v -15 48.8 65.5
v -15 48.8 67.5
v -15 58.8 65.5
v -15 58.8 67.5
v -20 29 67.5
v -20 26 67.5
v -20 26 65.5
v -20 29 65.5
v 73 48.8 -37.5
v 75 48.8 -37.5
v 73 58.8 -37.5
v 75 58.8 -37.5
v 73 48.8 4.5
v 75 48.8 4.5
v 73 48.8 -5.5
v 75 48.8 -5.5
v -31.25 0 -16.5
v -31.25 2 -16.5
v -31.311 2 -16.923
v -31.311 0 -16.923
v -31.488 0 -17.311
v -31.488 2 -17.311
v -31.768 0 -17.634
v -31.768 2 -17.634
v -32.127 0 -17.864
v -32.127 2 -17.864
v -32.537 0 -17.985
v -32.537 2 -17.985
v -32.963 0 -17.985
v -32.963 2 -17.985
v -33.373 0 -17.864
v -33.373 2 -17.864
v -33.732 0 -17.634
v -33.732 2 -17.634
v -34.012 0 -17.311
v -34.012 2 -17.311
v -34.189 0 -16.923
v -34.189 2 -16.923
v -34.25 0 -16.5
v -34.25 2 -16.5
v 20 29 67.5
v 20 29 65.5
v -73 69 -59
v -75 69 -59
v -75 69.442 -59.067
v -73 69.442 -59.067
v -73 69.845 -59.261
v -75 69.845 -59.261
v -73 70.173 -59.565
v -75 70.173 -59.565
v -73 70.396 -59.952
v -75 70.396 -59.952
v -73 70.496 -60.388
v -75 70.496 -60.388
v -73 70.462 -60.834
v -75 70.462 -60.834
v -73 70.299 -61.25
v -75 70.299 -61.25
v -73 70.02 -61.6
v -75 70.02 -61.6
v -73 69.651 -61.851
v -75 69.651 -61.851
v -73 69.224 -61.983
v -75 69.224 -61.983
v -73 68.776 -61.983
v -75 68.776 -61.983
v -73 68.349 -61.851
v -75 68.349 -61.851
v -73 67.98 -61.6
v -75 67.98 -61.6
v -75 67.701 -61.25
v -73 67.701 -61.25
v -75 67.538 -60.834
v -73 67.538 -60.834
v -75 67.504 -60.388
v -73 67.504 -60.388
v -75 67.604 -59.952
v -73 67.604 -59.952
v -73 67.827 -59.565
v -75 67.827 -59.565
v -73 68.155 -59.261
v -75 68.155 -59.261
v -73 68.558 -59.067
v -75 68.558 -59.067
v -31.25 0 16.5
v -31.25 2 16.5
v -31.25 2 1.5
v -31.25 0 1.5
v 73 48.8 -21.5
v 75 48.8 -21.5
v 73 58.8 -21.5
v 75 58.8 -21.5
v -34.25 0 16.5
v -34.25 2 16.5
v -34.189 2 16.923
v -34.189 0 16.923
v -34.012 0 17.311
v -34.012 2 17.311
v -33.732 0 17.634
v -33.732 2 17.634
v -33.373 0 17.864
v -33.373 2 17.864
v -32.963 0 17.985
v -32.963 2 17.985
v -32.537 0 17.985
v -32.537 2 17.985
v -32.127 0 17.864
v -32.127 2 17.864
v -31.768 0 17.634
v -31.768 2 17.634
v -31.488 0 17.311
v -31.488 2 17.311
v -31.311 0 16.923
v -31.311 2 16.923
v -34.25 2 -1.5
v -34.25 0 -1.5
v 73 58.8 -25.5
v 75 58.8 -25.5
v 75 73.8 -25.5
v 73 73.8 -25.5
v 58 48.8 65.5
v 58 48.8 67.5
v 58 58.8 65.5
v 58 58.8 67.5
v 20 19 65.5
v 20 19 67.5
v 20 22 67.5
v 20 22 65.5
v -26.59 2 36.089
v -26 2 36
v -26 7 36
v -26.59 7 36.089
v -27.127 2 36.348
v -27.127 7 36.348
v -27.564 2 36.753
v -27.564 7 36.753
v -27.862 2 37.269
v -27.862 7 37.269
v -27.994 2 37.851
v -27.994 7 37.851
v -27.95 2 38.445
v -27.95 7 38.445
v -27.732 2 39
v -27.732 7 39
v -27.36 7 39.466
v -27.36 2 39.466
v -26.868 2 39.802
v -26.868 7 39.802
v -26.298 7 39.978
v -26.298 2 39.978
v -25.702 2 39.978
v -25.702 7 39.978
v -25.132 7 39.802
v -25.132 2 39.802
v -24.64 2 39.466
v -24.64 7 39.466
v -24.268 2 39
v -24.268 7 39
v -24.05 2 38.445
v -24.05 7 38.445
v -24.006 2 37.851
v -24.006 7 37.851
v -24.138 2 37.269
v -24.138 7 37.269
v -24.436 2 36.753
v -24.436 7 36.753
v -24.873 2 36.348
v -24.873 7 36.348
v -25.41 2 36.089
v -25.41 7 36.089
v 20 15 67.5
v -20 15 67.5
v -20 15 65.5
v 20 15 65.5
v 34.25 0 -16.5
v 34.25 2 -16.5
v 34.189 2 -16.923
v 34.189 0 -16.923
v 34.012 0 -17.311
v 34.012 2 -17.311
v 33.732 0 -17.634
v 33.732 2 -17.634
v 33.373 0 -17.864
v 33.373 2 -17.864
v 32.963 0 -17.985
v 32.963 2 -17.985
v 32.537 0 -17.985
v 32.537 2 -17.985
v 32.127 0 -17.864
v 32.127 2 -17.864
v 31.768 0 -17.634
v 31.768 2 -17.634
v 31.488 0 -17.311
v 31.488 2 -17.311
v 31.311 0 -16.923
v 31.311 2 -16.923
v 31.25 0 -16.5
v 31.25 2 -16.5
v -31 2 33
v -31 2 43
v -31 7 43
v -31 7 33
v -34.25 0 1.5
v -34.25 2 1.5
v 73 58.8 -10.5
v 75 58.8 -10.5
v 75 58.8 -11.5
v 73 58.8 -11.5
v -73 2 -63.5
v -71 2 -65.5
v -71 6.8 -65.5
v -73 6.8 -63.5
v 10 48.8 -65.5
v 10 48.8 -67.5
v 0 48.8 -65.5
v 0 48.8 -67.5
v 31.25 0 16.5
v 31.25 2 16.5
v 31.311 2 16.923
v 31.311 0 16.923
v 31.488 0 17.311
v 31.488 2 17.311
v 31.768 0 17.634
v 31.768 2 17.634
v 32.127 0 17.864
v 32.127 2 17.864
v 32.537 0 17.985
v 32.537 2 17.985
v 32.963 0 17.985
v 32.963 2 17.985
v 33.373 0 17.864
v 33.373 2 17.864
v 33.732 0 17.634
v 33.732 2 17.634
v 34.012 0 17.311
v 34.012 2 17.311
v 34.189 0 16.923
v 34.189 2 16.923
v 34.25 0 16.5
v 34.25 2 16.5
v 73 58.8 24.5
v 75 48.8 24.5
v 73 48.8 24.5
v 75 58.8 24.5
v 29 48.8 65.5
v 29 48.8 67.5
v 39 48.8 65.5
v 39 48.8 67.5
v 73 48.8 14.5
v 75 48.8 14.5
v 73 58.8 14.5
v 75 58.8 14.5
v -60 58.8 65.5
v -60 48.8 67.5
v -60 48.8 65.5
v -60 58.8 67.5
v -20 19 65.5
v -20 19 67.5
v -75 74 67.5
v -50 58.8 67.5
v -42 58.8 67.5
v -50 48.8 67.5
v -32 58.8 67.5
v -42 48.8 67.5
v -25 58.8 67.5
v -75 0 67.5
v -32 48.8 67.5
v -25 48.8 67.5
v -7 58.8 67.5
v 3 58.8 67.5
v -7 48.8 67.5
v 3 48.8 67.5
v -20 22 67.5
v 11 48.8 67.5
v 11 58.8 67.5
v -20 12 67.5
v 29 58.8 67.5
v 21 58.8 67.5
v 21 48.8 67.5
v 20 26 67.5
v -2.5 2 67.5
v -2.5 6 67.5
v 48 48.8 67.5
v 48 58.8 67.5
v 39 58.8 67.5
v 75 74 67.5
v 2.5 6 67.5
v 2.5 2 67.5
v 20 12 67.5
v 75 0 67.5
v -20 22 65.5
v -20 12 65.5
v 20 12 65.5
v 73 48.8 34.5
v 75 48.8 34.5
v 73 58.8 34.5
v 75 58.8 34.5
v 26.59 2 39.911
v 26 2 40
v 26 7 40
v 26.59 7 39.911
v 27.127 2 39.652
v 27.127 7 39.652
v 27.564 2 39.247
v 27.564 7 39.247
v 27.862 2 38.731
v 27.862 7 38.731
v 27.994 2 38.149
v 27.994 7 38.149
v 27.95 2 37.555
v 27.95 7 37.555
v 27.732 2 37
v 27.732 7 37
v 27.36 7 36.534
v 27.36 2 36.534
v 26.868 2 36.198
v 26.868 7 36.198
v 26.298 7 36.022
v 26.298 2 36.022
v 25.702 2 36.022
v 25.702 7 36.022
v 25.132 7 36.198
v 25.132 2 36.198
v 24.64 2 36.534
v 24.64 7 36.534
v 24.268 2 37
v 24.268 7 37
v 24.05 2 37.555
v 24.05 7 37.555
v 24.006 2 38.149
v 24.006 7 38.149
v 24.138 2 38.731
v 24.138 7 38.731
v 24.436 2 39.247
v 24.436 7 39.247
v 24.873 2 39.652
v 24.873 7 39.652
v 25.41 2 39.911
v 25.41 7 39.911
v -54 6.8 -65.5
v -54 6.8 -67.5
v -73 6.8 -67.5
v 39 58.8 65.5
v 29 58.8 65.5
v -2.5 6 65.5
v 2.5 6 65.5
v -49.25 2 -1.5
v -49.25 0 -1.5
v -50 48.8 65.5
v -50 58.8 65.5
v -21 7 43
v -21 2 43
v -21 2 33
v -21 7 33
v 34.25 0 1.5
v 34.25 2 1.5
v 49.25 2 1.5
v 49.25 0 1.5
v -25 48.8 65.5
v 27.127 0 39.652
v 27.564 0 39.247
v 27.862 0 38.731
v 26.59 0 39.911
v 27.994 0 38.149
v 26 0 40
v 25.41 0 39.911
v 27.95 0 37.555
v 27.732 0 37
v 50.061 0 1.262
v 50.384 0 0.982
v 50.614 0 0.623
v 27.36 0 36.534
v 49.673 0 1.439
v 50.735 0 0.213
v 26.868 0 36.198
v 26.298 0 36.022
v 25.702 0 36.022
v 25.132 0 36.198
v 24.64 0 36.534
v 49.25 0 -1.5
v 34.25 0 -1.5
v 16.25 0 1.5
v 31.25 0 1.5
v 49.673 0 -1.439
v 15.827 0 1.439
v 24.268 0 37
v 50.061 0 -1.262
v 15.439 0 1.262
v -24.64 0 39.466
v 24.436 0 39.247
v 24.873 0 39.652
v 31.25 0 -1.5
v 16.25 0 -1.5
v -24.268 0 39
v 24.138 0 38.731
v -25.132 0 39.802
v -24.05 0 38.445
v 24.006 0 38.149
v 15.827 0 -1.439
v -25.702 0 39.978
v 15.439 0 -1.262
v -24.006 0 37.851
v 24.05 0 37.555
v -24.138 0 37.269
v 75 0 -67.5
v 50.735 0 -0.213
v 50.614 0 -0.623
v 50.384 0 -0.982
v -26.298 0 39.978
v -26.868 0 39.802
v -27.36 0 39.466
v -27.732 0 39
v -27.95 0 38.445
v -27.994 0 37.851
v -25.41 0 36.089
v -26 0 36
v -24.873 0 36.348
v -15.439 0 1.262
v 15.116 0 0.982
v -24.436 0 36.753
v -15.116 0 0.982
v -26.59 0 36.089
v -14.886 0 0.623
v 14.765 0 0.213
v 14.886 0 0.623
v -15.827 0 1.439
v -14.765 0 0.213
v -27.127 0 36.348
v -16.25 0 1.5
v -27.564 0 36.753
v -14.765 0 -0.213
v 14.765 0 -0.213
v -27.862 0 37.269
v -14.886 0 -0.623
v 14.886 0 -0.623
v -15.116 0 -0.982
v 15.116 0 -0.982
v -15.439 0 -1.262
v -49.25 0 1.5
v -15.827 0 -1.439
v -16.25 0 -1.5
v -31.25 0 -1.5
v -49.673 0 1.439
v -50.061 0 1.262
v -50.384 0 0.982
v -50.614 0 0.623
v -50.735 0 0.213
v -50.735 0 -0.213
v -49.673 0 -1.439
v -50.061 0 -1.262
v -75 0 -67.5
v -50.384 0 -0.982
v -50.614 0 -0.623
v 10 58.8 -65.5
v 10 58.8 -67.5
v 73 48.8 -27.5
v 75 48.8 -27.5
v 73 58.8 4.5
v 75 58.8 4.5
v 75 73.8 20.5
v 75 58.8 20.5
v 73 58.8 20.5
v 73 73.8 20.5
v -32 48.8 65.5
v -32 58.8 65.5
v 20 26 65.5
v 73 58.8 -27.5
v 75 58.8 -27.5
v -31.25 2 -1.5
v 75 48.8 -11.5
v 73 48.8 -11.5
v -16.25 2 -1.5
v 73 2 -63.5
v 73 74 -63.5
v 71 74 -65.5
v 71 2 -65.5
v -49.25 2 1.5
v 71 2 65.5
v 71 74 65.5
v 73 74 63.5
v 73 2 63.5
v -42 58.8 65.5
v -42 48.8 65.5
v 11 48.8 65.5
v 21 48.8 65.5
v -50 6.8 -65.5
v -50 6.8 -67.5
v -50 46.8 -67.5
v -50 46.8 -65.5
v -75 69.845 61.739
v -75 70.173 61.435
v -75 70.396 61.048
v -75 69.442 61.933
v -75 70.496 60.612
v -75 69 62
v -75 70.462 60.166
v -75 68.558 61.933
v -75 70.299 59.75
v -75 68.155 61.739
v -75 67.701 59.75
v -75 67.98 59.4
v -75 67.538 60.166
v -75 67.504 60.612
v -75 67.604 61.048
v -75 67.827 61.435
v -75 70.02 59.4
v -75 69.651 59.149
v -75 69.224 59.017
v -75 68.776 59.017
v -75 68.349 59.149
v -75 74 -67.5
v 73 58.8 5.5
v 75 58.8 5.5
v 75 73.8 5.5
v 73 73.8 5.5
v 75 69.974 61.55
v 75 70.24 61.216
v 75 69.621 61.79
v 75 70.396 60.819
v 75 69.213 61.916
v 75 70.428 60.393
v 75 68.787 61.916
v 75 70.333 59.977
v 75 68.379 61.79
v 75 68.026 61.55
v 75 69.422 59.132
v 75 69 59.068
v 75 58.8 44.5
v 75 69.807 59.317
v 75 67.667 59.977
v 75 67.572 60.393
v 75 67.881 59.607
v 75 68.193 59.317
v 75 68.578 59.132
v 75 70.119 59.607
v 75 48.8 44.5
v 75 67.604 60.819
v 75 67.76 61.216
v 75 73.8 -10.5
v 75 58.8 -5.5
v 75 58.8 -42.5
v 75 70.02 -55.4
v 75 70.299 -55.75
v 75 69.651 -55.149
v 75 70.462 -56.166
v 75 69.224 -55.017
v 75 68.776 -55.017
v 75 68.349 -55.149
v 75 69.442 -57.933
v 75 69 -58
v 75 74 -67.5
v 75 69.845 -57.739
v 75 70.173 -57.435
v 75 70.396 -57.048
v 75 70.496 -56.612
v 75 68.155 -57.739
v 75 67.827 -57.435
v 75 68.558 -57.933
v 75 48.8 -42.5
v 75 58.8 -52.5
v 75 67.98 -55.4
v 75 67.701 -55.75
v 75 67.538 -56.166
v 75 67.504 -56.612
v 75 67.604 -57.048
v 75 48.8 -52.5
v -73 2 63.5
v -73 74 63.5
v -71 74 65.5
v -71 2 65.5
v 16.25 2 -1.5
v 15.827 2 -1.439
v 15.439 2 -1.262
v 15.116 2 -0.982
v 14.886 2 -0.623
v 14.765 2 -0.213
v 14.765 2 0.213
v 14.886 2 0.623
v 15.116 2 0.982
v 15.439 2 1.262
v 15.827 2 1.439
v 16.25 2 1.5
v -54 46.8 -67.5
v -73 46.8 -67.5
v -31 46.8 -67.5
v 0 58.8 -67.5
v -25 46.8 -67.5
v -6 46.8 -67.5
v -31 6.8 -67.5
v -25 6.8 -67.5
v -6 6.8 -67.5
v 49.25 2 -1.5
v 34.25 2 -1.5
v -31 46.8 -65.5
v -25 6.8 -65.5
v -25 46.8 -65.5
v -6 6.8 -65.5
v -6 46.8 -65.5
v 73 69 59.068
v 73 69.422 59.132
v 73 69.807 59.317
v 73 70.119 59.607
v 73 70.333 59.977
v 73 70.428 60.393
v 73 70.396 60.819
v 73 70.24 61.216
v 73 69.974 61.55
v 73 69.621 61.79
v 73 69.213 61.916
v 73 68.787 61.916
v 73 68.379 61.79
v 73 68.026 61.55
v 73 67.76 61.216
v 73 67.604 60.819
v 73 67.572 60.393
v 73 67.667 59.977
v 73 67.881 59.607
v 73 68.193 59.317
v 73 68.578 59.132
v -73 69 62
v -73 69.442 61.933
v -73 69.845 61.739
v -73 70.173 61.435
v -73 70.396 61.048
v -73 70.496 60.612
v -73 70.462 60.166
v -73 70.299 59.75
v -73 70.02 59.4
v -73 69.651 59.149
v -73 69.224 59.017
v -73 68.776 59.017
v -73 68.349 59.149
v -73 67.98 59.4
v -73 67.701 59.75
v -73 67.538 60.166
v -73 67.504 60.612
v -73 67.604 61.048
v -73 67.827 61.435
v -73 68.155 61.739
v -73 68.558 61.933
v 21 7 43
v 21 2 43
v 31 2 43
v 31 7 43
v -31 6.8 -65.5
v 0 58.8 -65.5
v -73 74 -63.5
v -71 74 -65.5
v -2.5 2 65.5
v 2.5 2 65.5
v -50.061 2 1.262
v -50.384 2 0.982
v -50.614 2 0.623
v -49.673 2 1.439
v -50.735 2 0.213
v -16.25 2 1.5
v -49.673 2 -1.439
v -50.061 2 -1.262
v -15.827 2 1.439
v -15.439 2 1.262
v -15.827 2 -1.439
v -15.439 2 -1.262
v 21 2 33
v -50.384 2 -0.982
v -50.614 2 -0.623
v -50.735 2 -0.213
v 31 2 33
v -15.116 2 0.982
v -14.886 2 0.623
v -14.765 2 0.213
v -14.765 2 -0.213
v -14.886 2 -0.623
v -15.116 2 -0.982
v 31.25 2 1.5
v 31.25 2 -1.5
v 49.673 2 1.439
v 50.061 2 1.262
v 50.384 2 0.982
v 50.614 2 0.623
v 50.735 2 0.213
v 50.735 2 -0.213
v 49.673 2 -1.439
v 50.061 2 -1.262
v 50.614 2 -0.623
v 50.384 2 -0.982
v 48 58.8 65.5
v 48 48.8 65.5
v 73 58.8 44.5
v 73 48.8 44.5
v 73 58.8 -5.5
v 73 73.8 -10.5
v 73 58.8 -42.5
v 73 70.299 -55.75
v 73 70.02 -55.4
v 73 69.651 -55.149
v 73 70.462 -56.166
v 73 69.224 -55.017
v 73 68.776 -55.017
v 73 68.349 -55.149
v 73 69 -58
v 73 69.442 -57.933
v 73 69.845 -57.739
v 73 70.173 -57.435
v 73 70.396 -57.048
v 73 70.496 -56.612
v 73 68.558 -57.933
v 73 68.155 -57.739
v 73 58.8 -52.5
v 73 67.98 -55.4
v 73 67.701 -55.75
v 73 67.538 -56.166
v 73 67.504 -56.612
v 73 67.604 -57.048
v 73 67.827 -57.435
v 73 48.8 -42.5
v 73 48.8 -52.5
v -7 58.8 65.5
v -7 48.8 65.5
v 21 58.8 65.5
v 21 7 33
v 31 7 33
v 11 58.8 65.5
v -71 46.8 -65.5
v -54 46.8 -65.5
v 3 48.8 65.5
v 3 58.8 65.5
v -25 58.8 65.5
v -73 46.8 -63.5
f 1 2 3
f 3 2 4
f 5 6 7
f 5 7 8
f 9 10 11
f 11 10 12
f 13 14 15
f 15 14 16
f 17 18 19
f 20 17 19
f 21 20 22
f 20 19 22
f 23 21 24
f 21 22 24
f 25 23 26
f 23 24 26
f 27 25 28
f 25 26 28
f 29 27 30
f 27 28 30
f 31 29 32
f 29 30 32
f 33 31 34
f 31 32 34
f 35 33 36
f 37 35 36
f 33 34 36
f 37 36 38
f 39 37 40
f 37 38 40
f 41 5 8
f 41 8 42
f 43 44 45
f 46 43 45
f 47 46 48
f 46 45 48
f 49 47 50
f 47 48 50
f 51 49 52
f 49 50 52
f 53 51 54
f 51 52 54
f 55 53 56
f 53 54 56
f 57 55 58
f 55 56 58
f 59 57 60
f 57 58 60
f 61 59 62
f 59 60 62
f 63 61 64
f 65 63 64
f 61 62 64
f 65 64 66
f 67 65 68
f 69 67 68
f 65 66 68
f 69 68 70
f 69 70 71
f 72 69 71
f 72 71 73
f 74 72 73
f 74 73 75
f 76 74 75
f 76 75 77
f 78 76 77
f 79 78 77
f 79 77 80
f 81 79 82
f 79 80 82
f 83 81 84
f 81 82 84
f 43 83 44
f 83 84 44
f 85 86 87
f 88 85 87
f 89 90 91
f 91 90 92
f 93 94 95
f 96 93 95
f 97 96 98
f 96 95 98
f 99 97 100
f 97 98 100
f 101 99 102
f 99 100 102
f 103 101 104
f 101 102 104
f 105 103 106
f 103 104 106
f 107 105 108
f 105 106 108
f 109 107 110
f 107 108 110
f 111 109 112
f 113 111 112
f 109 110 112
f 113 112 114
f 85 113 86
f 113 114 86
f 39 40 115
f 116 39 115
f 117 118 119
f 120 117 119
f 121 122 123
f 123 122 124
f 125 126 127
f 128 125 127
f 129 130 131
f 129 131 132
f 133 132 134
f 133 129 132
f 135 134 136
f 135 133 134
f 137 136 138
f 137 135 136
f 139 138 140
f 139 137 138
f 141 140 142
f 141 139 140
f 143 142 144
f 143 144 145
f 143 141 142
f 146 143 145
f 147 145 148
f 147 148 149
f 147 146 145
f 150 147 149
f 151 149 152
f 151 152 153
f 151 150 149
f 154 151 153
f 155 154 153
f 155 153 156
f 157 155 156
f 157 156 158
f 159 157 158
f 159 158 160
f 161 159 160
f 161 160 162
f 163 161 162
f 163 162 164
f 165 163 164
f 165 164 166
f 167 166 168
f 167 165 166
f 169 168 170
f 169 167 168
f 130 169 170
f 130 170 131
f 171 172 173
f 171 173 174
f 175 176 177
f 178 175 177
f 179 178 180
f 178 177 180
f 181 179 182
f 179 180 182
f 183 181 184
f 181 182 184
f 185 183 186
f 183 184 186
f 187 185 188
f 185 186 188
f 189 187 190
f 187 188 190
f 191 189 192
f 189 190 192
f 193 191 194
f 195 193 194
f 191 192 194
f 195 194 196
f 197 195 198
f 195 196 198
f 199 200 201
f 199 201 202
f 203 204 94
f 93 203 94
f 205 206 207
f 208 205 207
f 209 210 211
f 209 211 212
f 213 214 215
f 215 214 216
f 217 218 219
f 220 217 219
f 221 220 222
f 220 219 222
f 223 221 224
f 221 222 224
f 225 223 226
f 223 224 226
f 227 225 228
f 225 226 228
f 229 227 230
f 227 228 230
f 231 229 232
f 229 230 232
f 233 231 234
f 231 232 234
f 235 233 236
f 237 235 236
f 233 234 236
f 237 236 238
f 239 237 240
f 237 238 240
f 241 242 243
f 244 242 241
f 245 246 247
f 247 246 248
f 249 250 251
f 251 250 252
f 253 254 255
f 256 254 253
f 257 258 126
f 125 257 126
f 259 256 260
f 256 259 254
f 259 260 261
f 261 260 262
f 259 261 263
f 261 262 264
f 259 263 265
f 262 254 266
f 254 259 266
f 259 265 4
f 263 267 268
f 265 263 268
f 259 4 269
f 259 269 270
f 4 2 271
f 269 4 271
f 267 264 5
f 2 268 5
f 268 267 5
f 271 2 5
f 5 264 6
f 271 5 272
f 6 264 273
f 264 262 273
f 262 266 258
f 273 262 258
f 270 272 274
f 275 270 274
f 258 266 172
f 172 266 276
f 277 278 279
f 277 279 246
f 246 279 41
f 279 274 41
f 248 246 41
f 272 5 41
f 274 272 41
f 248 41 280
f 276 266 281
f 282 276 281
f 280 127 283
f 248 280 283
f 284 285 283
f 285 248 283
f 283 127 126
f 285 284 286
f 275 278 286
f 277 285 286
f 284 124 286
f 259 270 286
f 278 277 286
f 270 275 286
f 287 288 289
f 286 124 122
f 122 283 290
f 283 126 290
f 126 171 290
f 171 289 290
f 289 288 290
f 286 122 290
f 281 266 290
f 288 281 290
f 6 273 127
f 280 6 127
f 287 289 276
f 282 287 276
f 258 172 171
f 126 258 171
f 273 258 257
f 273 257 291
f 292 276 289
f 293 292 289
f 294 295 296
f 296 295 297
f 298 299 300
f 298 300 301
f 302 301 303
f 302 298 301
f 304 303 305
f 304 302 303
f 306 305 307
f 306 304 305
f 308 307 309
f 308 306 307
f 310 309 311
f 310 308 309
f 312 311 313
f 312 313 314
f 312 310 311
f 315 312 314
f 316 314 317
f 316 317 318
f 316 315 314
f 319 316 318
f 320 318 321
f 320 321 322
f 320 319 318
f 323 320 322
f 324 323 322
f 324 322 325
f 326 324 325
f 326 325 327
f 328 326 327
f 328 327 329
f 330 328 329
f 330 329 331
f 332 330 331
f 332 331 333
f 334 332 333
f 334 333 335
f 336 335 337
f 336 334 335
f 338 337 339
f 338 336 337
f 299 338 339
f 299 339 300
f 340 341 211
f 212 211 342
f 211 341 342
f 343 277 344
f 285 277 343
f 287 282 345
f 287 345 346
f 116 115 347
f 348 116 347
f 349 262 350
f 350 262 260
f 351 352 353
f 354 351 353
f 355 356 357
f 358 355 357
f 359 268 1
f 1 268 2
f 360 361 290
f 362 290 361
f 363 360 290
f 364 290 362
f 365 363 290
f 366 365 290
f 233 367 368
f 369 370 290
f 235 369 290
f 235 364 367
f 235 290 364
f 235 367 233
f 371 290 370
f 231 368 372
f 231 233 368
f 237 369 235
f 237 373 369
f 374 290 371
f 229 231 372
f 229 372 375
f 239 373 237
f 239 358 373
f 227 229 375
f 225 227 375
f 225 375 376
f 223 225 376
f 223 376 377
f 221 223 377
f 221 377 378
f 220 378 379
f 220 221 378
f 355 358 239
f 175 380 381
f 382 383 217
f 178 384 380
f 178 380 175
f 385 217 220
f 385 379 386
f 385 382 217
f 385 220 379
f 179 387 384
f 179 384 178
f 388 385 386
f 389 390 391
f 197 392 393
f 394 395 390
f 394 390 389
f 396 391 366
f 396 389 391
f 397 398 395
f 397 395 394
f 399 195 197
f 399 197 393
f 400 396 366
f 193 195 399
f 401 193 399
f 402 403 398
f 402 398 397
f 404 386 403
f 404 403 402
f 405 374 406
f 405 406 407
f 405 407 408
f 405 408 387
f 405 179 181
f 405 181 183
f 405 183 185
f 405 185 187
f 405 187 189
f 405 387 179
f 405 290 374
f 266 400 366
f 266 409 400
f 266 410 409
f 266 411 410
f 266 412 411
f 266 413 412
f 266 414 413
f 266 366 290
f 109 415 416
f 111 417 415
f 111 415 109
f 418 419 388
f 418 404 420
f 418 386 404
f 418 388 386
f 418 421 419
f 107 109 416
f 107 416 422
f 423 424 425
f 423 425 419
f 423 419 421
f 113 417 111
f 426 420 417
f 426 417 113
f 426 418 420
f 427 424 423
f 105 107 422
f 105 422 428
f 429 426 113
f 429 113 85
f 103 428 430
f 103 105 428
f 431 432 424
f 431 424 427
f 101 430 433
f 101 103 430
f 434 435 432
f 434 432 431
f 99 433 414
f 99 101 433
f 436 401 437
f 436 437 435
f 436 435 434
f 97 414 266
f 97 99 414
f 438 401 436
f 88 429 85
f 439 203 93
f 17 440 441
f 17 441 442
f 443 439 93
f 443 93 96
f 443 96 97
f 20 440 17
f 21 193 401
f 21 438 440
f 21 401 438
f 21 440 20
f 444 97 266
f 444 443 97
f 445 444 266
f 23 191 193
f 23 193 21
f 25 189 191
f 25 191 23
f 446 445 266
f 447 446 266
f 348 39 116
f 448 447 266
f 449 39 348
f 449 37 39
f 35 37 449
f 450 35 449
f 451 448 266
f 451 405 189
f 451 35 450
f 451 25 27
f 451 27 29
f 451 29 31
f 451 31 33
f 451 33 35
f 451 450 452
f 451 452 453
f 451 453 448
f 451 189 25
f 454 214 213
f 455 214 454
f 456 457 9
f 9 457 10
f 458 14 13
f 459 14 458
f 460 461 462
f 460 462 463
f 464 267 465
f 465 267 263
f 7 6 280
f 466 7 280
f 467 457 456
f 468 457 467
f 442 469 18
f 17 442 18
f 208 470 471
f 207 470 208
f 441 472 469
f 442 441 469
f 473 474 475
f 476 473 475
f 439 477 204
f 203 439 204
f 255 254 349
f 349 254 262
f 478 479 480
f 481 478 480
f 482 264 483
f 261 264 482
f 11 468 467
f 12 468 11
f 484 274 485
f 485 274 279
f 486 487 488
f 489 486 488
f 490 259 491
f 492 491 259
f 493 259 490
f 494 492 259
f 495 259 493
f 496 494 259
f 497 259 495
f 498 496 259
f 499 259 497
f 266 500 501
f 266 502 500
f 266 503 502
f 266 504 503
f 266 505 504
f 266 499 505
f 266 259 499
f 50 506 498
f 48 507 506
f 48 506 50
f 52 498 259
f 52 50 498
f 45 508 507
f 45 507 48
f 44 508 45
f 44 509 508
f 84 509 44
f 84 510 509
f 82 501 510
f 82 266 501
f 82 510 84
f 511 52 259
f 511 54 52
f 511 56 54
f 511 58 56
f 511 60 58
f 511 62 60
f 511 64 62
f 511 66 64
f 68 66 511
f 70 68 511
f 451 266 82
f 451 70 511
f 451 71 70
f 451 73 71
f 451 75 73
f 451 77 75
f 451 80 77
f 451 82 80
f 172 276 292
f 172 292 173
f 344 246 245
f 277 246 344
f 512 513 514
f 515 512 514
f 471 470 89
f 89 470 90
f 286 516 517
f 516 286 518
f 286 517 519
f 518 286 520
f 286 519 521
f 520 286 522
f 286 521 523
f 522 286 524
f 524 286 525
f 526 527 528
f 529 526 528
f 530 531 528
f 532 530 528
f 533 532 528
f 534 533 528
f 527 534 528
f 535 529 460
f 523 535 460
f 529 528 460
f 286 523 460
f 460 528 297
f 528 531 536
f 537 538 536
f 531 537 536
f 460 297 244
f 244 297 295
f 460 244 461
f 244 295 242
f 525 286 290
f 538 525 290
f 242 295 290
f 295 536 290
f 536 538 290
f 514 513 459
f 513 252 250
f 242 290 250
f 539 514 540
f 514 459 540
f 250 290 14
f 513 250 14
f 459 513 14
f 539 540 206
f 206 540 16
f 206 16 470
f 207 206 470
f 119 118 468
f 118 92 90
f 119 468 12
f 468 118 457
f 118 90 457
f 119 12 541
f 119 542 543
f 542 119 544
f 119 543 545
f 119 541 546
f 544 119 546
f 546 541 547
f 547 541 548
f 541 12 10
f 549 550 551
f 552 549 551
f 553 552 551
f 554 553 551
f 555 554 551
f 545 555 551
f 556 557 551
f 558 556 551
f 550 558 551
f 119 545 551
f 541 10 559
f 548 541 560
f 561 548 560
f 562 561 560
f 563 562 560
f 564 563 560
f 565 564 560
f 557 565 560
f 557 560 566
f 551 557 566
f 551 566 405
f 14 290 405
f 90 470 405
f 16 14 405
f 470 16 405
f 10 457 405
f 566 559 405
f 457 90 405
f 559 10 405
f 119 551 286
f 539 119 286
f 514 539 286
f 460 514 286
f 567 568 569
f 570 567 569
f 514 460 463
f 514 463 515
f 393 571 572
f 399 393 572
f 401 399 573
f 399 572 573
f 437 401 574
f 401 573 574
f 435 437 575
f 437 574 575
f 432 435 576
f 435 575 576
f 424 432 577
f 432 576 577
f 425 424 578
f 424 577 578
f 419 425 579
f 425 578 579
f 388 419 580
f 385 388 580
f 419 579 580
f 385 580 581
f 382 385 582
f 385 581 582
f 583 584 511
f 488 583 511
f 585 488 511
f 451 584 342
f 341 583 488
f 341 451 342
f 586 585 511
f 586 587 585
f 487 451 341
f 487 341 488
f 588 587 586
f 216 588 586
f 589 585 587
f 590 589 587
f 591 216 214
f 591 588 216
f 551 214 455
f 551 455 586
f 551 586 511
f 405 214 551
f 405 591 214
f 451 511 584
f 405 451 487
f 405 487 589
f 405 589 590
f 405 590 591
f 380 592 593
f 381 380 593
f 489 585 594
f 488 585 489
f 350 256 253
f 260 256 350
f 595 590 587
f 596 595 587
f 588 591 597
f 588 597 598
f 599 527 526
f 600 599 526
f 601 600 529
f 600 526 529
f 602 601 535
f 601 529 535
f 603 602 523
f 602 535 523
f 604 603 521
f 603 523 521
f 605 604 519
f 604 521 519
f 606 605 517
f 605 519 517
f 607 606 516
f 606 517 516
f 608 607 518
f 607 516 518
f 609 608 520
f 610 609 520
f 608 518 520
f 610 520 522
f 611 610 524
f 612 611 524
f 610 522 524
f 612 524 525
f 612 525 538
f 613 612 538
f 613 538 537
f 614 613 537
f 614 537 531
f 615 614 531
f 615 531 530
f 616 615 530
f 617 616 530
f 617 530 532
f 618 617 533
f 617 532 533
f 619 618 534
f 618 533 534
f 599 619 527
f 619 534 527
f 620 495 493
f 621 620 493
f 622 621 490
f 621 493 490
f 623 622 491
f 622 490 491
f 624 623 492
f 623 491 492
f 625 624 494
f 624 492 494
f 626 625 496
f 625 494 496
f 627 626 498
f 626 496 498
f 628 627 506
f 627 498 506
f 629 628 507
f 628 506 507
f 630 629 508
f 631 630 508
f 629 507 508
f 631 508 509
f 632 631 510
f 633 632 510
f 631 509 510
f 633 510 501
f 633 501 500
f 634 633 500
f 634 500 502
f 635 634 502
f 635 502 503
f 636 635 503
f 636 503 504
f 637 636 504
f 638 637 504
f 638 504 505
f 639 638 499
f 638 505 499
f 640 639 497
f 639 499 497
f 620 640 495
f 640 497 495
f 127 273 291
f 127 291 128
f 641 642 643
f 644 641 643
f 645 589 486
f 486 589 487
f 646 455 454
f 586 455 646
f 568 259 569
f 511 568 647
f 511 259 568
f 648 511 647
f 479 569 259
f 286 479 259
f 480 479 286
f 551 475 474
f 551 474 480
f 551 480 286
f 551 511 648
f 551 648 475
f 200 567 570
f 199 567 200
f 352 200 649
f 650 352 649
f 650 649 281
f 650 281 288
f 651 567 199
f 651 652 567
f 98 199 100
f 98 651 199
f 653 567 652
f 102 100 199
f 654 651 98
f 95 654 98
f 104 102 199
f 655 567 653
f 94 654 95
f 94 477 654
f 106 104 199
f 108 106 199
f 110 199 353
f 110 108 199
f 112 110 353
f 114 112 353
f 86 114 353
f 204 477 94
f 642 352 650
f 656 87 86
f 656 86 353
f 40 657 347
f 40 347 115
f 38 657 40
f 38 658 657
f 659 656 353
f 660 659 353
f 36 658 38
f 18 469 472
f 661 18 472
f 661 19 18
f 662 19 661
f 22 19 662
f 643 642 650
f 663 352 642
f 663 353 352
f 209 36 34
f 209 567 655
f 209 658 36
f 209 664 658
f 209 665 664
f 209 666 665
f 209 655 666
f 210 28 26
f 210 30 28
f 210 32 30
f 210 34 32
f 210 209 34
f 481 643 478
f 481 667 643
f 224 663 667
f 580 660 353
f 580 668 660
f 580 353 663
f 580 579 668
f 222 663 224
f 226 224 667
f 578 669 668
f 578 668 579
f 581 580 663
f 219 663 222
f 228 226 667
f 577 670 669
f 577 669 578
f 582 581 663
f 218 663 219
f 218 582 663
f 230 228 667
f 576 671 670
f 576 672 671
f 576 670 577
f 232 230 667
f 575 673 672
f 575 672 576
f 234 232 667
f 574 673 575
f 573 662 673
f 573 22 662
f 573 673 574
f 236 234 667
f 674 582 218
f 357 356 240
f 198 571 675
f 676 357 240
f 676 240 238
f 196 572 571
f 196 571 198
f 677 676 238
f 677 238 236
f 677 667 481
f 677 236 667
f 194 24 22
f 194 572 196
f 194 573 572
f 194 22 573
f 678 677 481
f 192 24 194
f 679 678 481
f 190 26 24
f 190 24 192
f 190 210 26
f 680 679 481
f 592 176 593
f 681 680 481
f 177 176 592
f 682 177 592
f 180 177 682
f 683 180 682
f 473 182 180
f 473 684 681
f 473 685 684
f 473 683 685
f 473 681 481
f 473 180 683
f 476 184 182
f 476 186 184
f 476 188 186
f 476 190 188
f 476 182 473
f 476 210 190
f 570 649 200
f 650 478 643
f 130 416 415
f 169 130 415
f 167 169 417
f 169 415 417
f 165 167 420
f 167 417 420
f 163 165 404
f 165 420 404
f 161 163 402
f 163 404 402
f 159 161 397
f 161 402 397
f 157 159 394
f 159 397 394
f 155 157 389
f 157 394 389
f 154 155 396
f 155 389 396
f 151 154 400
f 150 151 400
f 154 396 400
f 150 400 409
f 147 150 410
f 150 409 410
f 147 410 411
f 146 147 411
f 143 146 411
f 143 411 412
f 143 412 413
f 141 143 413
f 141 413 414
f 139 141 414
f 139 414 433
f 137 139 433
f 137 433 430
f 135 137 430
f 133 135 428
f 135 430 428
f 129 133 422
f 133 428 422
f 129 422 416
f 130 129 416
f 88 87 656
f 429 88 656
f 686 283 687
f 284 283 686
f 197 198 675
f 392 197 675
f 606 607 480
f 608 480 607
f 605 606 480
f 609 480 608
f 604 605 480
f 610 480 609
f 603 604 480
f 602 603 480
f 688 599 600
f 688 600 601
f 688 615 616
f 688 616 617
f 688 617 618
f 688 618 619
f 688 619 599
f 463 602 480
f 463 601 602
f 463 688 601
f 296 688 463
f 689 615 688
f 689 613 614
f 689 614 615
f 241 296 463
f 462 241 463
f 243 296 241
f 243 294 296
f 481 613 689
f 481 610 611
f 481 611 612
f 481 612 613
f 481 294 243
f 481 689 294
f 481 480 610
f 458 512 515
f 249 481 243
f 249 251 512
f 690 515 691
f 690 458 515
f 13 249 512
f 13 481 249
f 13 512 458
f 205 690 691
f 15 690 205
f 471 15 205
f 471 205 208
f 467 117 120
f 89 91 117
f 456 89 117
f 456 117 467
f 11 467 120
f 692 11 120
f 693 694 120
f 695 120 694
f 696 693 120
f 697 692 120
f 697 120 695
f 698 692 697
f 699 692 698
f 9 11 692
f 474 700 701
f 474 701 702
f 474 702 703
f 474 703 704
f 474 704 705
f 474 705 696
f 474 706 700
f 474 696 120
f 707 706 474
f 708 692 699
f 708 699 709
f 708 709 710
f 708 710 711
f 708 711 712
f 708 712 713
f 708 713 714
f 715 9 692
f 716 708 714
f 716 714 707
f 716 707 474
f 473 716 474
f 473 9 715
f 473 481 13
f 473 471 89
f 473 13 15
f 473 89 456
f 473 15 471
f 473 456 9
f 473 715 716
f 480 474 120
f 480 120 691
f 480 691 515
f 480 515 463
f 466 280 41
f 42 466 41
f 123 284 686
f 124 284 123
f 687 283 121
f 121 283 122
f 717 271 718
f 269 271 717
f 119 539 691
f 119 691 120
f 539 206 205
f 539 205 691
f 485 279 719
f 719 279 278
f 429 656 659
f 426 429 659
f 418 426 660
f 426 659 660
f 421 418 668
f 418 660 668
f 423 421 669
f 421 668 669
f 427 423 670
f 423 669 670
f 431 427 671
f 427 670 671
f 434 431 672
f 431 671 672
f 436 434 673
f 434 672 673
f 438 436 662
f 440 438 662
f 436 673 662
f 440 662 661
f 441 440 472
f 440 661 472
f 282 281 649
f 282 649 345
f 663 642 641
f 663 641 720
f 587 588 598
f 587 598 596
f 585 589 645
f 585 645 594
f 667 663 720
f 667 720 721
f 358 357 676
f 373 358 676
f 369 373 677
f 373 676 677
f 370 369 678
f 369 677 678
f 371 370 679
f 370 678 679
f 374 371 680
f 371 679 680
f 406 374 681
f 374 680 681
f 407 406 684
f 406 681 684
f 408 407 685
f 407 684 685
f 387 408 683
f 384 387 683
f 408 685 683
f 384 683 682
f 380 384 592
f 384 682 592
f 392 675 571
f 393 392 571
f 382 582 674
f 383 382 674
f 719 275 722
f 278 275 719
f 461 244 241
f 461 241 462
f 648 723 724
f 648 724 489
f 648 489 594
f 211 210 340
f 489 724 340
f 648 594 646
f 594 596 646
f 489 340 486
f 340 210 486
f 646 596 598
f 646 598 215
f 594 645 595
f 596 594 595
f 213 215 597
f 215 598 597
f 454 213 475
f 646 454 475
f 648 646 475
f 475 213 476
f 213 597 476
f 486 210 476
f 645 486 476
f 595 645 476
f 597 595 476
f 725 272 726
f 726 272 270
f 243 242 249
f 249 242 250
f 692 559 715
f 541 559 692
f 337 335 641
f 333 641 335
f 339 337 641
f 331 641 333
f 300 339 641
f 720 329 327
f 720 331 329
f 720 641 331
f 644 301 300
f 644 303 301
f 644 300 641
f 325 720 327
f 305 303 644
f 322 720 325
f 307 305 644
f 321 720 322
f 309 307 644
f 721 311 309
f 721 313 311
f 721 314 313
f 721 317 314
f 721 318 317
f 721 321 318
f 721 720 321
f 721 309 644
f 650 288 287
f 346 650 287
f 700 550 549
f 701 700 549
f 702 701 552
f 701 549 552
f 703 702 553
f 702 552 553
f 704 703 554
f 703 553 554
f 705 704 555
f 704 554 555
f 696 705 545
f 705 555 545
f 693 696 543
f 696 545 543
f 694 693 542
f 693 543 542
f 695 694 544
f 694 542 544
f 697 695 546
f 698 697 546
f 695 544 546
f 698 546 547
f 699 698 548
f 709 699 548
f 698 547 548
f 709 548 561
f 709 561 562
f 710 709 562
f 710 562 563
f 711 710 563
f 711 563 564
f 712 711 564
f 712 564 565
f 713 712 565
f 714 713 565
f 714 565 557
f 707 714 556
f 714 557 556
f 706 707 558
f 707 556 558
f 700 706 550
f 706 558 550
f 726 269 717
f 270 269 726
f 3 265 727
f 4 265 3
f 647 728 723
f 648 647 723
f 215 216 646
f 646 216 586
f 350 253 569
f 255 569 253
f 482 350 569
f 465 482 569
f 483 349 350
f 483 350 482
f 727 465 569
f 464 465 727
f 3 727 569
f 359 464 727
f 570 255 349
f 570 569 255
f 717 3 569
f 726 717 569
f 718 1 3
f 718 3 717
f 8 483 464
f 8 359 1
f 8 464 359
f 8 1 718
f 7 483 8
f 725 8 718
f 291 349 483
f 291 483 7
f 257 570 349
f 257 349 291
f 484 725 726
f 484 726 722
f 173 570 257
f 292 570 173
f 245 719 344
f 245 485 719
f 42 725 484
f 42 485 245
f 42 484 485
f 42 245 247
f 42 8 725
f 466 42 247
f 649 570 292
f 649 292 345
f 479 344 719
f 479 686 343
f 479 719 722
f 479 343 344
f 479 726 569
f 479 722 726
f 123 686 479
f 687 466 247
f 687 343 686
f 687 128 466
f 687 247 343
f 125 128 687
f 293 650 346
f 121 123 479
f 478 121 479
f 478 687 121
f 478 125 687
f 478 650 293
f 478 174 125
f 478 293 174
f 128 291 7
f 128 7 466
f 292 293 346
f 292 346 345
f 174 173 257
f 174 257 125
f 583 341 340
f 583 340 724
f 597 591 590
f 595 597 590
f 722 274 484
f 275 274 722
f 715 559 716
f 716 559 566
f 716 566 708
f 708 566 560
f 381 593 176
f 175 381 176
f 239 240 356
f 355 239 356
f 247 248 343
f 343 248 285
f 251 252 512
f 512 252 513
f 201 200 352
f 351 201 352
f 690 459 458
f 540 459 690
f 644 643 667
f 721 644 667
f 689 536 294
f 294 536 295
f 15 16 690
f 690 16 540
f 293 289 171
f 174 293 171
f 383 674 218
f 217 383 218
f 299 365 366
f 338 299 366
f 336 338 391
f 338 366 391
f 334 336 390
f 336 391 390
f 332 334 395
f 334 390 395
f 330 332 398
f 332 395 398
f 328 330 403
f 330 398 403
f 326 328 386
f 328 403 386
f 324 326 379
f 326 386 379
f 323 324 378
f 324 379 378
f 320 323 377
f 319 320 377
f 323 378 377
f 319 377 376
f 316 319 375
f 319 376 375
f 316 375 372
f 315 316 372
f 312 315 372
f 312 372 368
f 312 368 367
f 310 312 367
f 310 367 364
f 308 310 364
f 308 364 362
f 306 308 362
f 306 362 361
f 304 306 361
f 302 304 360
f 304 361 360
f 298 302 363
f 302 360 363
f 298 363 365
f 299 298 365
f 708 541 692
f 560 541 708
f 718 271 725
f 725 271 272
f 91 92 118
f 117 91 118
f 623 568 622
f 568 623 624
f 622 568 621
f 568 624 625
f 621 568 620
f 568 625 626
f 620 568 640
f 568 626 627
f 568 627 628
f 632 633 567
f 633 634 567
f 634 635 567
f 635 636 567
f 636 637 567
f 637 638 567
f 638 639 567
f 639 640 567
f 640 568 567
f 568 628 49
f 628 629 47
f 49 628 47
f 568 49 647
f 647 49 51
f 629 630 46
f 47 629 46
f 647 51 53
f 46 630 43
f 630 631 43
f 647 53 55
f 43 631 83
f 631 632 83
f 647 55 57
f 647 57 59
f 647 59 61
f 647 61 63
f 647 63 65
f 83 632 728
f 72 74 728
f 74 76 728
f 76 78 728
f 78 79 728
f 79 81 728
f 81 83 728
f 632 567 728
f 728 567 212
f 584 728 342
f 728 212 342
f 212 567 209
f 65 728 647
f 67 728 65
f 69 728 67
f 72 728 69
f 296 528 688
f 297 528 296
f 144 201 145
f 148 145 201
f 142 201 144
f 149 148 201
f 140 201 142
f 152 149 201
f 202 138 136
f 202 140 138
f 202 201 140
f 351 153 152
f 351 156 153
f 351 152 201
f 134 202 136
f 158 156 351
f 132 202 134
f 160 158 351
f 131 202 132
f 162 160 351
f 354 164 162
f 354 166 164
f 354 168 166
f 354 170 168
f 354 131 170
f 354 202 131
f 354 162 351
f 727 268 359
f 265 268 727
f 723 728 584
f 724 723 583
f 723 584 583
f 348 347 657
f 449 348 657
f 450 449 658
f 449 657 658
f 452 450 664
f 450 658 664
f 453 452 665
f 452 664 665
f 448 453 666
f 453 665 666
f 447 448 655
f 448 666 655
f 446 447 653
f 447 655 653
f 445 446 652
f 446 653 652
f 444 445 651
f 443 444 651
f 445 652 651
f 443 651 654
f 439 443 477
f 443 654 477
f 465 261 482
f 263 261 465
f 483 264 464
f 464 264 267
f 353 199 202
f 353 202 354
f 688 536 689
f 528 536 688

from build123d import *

# Parameters (mm, degrees)
CROQUIS1_W              = 150
CROQUIS1_H              = 135
SALIENTE_EXTRUIR1_DEPTH = 2
CORTAR_EXTRUIR2_DEPTH   = 2
CROQUIS4_W              = 150
CROQUIS4_H              = 135
CROQUIS4_W_2            = 146
CROQUIS4_H_2            = 131
SALIENTE_EXTRUIR3_DEPTH = 72
CROQUIS5_R              = 1.5
CORTAR_EXTRUIR3_DEPTH   = 2
CROQUIS6_R              = 1.5
CORTAR_EXTRUIR4_DEPTH   = 2
CROQUIS7_R              = 1.5
CORTAR_EXTRUIR5_DEPTH   = 2
CROQUIS8_R              = 1.43177866
CORTAR_EXTRUIR6_DEPTH   = 2
CROQUIS9_W              = 10
CROQUIS9_H              = 10
CORTAR_EXTRUIR7_DEPTH   = 2
CROQUIS10_W             = 10
CROQUIS10_H             = 10
CORTAR_EXTRUIR8_DEPTH   = 2
CROQUIS11_W             = 10
CROQUIS11_H             = 10
CROQUIS11_W_2           = 19
CROQUIS11_H_2           = 40
CORTAR_EXTRUIR9_DEPTH   = 2
CROQUIS13_R             = 2
CORTAR_EXTRUIR11_DEPTH  = 2
CROQUIS14_W             = 10
CROQUIS14_H             = 10
CROQUIS14_R             = 2
SALIENTE_EXTRUIR4_DEPTH = 5
CROQUIS15_W             = 5
CROQUIS15_H             = 4
CROQUIS15_W_2           = 40
CROQUIS15_H_2           = 3
CORTAR_EXTRUIR12_DEPTH  = 2
CROQUIS12_W             = 15
CROQUIS12_H             = 15
CORTAR_EXTRUIR13_DEPTH  = 2
SALIENTE_EXTRUIR5_DEPTH = 74
SALIENTE_EXTRUIR6_DEPTH = 27.2
SALIENTE_EXTRUIR7_REACH = 123.232


with BuildPart() as part:
    # Croquis1 → Saliente-Extruir1 (new body)
    with BuildSketch(Plane(origin=(0, 0, 0), x_dir=(1, 0, 0), z_dir=(0, 1, 0))):
        Rectangle(CROQUIS1_W, CROQUIS1_H)
    extrude(amount=SALIENTE_EXTRUIR1_DEPTH)

    # Croquis2 → Cortar-Extruir2 (cut)
    with BuildSketch(Plane(origin=(0, 2, 0), x_dir=(1, 0, 0), z_dir=(0, 1, 0))):
        with BuildLine():
            Line((31.25, 16.5), (31.25, 1.5))
            Line((31.25, 1.5), (16.25, 1.5))
            ThreePointArc((16.25, 1.5), (14.75, 0), (16.25, -1.5))
            Line((16.25, -1.5), (31.25, -1.5))
            Line((31.25, -1.5), (31.25, -16.5))
            ThreePointArc((31.25, -16.5), (32.75, -18), (34.25, -16.5))
            Line((34.25, -16.5), (34.25, -1.5))
            Line((34.25, -1.5), (49.25, -1.5))
            ThreePointArc((49.25, -1.5), (50.75, 0), (49.25, 1.5))
            Line((49.25, 1.5), (34.25, 1.5))
            Line((34.25, 1.5), (34.25, 16.5))
            ThreePointArc((34.25, 16.5), (32.75, 18), (31.25, 16.5))
        make_face()
        with BuildLine():
            Line((-31.25, -16.5), (-31.25, -1.5))
            Line((-31.25, -1.5), (-16.25, -1.5))
            ThreePointArc((-16.25, -1.5), (-14.75, 0), (-16.25, 1.5))
            Line((-16.25, 1.5), (-31.25, 1.5))
            Line((-31.25, 1.5), (-31.25, 16.5))
            ThreePointArc((-31.25, 16.5), (-32.75, 18), (-34.25, 16.5))
            Line((-34.25, 16.5), (-34.25, 1.5))
            Line((-34.25, 1.5), (-49.25, 1.5))
            ThreePointArc((-49.25, 1.5), (-50.75, 0), (-49.25, -1.5))
            Line((-49.25, -1.5), (-34.25, -1.5))
            Line((-34.25, -1.5), (-34.25, -16.5))
            ThreePointArc((-34.25, -16.5), (-32.75, -18), (-31.25, -16.5))
        make_face()
    extrude(amount=-CORTAR_EXTRUIR2_DEPTH, mode=Mode.SUBTRACT)

    # Croquis4 → Saliente-Extruir3 (add)
    with BuildSketch(Plane(origin=(0, 2, 0), x_dir=(1, 0, 0), z_dir=(0, 1, 0))):
        Rectangle(CROQUIS4_W, CROQUIS4_H)
        Rectangle(CROQUIS4_W_2, CROQUIS4_H_2, mode=Mode.SUBTRACT)
    extrude(amount=SALIENTE_EXTRUIR3_DEPTH)

    # Croquis5 → Cortar-Extruir3 (cut)
    with BuildSketch(Plane.ZY.offset(75)):
        with Locations((-60.5, 69)):
            Circle(CROQUIS5_R)
    extrude(amount=-CORTAR_EXTRUIR3_DEPTH, mode=Mode.SUBTRACT)

    # Croquis6 → Cortar-Extruir4 (cut)
    with BuildSketch(Plane.ZY.offset(75)):
        with Locations((60.5, 69)):
            Circle(CROQUIS6_R)
    extrude(amount=-CORTAR_EXTRUIR4_DEPTH, mode=Mode.SUBTRACT)

    # Croquis7 → Cortar-Extruir5 (cut)
    with BuildSketch(Plane(origin=(75, 0, 0), x_dir=(0, 0, -1), z_dir=(1, 0, 0))):
        with Locations((56.5, 69)):
            Circle(CROQUIS7_R)
    extrude(amount=-CORTAR_EXTRUIR5_DEPTH, mode=Mode.SUBTRACT)

    # Croquis8 → Cortar-Extruir6 (cut)
    with BuildSketch(Plane(origin=(75, 0, 0), x_dir=(0, 0, -1), z_dir=(1, 0, 0))):
        with Locations((-60.5, 69)):
            Circle(CROQUIS8_R)
    extrude(amount=-CORTAR_EXTRUIR6_DEPTH, mode=Mode.SUBTRACT)

    # Croquis9 → Cortar-Extruir7 (cut)
    with BuildSketch(Plane.XY.offset(67.5)):
        with Locations((-2, 53.8)):
            Rectangle(CROQUIS9_W, CROQUIS9_H)
        with Locations((-55, 53.8)):
            Rectangle(CROQUIS9_W, CROQUIS9_H)
        with Locations((-37, 53.8)):
            Rectangle(CROQUIS9_W, CROQUIS9_H)
        with Locations((-20, 53.8)):
            Rectangle(CROQUIS9_W, CROQUIS9_H)
        with Locations((16, 53.8)):
            Rectangle(CROQUIS9_W, CROQUIS9_H)
        with Locations((34, 53.8)):
            Rectangle(CROQUIS9_W, CROQUIS9_H)
        with Locations((53, 53.8)):
            Rectangle(CROQUIS9_W, CROQUIS9_H)
    extrude(amount=-CORTAR_EXTRUIR7_DEPTH, mode=Mode.SUBTRACT)

    # Croquis10 → Cortar-Extruir8 (cut)
    with BuildSketch(Plane(origin=(75, 0, 0), x_dir=(0, 0, -1), z_dir=(1, 0, 0))):
        with Locations((16.5, 53.8)):
            Rectangle(CROQUIS10_W, CROQUIS10_H)
        with Locations((-39.5, 53.8)):
            Rectangle(CROQUIS10_W, CROQUIS10_H)
        with Locations((-19.5, 53.8)):
            Rectangle(CROQUIS10_W, CROQUIS10_H)
        with Locations((0.5, 53.8)):
            Rectangle(CROQUIS10_W, CROQUIS10_H)
        with Locations((32.5, 53.8)):
            Rectangle(CROQUIS10_W, CROQUIS10_H)
        with Locations((47.5, 53.8)):
            Rectangle(CROQUIS10_W, CROQUIS10_H)
    extrude(amount=-CORTAR_EXTRUIR8_DEPTH, mode=Mode.SUBTRACT)

    # Croquis11 → Cortar-Extruir9 (cut)
    with BuildSketch(Plane(origin=(0, 0, -67.5), x_dir=(-1, 0, 0), z_dir=(0, 0, -1))):
        with Locations((-5, 53.8)):
            Rectangle(CROQUIS11_W, CROQUIS11_H)
        with Locations((15.5, 26.8)):
            Rectangle(CROQUIS11_W_2, CROQUIS11_H_2)
        with Locations((40.5, 26.8)):
            Rectangle(CROQUIS11_W_2, CROQUIS11_H_2)
        with Locations((63.5, 26.8)):
            Rectangle(CROQUIS11_W_2, CROQUIS11_H_2)
    extrude(amount=-CORTAR_EXTRUIR9_DEPTH, mode=Mode.SUBTRACT)

    # Croquis13 → Cortar-Extruir11 (cut)
    with BuildSketch(Plane.XZ):
        with Locations(Location((-26, 38, 0), (0, 0, 270))):
            Circle(CROQUIS13_R)
        with Locations(Location((26, 38, 0), (0, 0, 90))):
            Circle(CROQUIS13_R)
    extrude(amount=-CORTAR_EXTRUIR11_DEPTH, mode=Mode.SUBTRACT)

    # Croquis14 → Saliente-Extruir4 (add)
    # profile 1 of 2: a face of its own
    with BuildSketch(Plane(origin=(0, 2, 0), x_dir=(1, 0, 0), z_dir=(0, 1, 0))):
        with Locations((26, -38)):
            Rectangle(CROQUIS14_W, CROQUIS14_H)
        with Locations(Location((26, -38, 0), (0, 0, 270))):
            Circle(CROQUIS14_R, mode=Mode.SUBTRACT)
    # profile 2 of 2: a face of its own
    with BuildSketch(Plane(origin=(0, 2, 0), x_dir=(1, 0, 0), z_dir=(0, 1, 0))):
        with Locations((-26, -38)):
            Rectangle(CROQUIS14_W, CROQUIS14_H)
        with Locations(Location((-26, -38, 0), (0, 0, 90))):
            Circle(CROQUIS14_R, mode=Mode.SUBTRACT)
    extrude(amount=SALIENTE_EXTRUIR4_DEPTH)

    # Croquis15 → Cortar-Extruir12 (cut)
    with BuildSketch(Plane.XY.offset(67.5)):
        with Locations((0, 4)):
            Rectangle(CROQUIS15_W, CROQUIS15_H)
        with Locations((0, 13.5)):
            Rectangle(CROQUIS15_W_2, CROQUIS15_H_2)
        with Locations((0, 20.5)):
            Rectangle(CROQUIS15_W_2, CROQUIS15_H_2)
        with Locations((0, 27.5)):
            Rectangle(CROQUIS15_W_2, CROQUIS15_H_2)
    extrude(amount=-CORTAR_EXTRUIR12_DEPTH, mode=Mode.SUBTRACT)

    # Croquis12 → Cortar-Extruir13 (cut)
    with BuildSketch(Plane(origin=(75, 0, 0), x_dir=(0, 0, -1), z_dir=(1, 0, 0))):
        with Locations((18, 66.3)):
            Rectangle(CROQUIS12_W, CROQUIS12_H)
        with Locations((-13, 66.3)):
            Rectangle(CROQUIS12_W, CROQUIS12_H)
    extrude(amount=-CORTAR_EXTRUIR13_DEPTH, mode=Mode.SUBTRACT)

    # Croquis16 → Saliente-Extruir5 (add)
    with BuildSketch(Plane(origin=(0, 74, 0), x_dir=(1, 0, 0), z_dir=(0, 1, 0))):
        Polygon((-73, -65.5), (-73, -63.5), (-71, -65.5), align=None)
        Polygon((73, -65.5), (71, -65.5), (73, -63.5), align=None)
        Polygon((73, 65.5), (73, 63.5), (71, 65.5), align=None)
    extrude(amount=-SALIENTE_EXTRUIR5_DEPTH)

    # Croquis17 → Saliente-Extruir6 (add)
    with BuildSketch(Plane(origin=(0, 74, 0), x_dir=(1, 0, 0), z_dir=(0, 1, 0))):
        Polygon((-73, 65.5), (-73, 63.5), (-71, 65.5), align=None)
    extrude(amount=-SALIENTE_EXTRUIR6_DEPTH)

    # Croquis18 → Saliente-Extruir7 (add, up to next)
    with BuildSketch(Plane(origin=(0, 6.8, 0), x_dir=(1, 0, 0), z_dir=(0, 1, 0)), mode=Mode.PRIVATE) as saliente_extruir7_sk1:
        Polygon((-73, 65.5), (-71, 65.5), (-73, 63.5), align=None)
    saliente_extruir7_tool1 = extrude(saliente_extruir7_sk1.sketch, amount=-SALIENTE_EXTRUIR7_REACH, mode=Mode.PRIVATE) - part.part
    add(saliente_extruir7_tool1.solids().sort_by_distance((-72.333333, 6.8, -64.833333))[0])


solid = part.part
